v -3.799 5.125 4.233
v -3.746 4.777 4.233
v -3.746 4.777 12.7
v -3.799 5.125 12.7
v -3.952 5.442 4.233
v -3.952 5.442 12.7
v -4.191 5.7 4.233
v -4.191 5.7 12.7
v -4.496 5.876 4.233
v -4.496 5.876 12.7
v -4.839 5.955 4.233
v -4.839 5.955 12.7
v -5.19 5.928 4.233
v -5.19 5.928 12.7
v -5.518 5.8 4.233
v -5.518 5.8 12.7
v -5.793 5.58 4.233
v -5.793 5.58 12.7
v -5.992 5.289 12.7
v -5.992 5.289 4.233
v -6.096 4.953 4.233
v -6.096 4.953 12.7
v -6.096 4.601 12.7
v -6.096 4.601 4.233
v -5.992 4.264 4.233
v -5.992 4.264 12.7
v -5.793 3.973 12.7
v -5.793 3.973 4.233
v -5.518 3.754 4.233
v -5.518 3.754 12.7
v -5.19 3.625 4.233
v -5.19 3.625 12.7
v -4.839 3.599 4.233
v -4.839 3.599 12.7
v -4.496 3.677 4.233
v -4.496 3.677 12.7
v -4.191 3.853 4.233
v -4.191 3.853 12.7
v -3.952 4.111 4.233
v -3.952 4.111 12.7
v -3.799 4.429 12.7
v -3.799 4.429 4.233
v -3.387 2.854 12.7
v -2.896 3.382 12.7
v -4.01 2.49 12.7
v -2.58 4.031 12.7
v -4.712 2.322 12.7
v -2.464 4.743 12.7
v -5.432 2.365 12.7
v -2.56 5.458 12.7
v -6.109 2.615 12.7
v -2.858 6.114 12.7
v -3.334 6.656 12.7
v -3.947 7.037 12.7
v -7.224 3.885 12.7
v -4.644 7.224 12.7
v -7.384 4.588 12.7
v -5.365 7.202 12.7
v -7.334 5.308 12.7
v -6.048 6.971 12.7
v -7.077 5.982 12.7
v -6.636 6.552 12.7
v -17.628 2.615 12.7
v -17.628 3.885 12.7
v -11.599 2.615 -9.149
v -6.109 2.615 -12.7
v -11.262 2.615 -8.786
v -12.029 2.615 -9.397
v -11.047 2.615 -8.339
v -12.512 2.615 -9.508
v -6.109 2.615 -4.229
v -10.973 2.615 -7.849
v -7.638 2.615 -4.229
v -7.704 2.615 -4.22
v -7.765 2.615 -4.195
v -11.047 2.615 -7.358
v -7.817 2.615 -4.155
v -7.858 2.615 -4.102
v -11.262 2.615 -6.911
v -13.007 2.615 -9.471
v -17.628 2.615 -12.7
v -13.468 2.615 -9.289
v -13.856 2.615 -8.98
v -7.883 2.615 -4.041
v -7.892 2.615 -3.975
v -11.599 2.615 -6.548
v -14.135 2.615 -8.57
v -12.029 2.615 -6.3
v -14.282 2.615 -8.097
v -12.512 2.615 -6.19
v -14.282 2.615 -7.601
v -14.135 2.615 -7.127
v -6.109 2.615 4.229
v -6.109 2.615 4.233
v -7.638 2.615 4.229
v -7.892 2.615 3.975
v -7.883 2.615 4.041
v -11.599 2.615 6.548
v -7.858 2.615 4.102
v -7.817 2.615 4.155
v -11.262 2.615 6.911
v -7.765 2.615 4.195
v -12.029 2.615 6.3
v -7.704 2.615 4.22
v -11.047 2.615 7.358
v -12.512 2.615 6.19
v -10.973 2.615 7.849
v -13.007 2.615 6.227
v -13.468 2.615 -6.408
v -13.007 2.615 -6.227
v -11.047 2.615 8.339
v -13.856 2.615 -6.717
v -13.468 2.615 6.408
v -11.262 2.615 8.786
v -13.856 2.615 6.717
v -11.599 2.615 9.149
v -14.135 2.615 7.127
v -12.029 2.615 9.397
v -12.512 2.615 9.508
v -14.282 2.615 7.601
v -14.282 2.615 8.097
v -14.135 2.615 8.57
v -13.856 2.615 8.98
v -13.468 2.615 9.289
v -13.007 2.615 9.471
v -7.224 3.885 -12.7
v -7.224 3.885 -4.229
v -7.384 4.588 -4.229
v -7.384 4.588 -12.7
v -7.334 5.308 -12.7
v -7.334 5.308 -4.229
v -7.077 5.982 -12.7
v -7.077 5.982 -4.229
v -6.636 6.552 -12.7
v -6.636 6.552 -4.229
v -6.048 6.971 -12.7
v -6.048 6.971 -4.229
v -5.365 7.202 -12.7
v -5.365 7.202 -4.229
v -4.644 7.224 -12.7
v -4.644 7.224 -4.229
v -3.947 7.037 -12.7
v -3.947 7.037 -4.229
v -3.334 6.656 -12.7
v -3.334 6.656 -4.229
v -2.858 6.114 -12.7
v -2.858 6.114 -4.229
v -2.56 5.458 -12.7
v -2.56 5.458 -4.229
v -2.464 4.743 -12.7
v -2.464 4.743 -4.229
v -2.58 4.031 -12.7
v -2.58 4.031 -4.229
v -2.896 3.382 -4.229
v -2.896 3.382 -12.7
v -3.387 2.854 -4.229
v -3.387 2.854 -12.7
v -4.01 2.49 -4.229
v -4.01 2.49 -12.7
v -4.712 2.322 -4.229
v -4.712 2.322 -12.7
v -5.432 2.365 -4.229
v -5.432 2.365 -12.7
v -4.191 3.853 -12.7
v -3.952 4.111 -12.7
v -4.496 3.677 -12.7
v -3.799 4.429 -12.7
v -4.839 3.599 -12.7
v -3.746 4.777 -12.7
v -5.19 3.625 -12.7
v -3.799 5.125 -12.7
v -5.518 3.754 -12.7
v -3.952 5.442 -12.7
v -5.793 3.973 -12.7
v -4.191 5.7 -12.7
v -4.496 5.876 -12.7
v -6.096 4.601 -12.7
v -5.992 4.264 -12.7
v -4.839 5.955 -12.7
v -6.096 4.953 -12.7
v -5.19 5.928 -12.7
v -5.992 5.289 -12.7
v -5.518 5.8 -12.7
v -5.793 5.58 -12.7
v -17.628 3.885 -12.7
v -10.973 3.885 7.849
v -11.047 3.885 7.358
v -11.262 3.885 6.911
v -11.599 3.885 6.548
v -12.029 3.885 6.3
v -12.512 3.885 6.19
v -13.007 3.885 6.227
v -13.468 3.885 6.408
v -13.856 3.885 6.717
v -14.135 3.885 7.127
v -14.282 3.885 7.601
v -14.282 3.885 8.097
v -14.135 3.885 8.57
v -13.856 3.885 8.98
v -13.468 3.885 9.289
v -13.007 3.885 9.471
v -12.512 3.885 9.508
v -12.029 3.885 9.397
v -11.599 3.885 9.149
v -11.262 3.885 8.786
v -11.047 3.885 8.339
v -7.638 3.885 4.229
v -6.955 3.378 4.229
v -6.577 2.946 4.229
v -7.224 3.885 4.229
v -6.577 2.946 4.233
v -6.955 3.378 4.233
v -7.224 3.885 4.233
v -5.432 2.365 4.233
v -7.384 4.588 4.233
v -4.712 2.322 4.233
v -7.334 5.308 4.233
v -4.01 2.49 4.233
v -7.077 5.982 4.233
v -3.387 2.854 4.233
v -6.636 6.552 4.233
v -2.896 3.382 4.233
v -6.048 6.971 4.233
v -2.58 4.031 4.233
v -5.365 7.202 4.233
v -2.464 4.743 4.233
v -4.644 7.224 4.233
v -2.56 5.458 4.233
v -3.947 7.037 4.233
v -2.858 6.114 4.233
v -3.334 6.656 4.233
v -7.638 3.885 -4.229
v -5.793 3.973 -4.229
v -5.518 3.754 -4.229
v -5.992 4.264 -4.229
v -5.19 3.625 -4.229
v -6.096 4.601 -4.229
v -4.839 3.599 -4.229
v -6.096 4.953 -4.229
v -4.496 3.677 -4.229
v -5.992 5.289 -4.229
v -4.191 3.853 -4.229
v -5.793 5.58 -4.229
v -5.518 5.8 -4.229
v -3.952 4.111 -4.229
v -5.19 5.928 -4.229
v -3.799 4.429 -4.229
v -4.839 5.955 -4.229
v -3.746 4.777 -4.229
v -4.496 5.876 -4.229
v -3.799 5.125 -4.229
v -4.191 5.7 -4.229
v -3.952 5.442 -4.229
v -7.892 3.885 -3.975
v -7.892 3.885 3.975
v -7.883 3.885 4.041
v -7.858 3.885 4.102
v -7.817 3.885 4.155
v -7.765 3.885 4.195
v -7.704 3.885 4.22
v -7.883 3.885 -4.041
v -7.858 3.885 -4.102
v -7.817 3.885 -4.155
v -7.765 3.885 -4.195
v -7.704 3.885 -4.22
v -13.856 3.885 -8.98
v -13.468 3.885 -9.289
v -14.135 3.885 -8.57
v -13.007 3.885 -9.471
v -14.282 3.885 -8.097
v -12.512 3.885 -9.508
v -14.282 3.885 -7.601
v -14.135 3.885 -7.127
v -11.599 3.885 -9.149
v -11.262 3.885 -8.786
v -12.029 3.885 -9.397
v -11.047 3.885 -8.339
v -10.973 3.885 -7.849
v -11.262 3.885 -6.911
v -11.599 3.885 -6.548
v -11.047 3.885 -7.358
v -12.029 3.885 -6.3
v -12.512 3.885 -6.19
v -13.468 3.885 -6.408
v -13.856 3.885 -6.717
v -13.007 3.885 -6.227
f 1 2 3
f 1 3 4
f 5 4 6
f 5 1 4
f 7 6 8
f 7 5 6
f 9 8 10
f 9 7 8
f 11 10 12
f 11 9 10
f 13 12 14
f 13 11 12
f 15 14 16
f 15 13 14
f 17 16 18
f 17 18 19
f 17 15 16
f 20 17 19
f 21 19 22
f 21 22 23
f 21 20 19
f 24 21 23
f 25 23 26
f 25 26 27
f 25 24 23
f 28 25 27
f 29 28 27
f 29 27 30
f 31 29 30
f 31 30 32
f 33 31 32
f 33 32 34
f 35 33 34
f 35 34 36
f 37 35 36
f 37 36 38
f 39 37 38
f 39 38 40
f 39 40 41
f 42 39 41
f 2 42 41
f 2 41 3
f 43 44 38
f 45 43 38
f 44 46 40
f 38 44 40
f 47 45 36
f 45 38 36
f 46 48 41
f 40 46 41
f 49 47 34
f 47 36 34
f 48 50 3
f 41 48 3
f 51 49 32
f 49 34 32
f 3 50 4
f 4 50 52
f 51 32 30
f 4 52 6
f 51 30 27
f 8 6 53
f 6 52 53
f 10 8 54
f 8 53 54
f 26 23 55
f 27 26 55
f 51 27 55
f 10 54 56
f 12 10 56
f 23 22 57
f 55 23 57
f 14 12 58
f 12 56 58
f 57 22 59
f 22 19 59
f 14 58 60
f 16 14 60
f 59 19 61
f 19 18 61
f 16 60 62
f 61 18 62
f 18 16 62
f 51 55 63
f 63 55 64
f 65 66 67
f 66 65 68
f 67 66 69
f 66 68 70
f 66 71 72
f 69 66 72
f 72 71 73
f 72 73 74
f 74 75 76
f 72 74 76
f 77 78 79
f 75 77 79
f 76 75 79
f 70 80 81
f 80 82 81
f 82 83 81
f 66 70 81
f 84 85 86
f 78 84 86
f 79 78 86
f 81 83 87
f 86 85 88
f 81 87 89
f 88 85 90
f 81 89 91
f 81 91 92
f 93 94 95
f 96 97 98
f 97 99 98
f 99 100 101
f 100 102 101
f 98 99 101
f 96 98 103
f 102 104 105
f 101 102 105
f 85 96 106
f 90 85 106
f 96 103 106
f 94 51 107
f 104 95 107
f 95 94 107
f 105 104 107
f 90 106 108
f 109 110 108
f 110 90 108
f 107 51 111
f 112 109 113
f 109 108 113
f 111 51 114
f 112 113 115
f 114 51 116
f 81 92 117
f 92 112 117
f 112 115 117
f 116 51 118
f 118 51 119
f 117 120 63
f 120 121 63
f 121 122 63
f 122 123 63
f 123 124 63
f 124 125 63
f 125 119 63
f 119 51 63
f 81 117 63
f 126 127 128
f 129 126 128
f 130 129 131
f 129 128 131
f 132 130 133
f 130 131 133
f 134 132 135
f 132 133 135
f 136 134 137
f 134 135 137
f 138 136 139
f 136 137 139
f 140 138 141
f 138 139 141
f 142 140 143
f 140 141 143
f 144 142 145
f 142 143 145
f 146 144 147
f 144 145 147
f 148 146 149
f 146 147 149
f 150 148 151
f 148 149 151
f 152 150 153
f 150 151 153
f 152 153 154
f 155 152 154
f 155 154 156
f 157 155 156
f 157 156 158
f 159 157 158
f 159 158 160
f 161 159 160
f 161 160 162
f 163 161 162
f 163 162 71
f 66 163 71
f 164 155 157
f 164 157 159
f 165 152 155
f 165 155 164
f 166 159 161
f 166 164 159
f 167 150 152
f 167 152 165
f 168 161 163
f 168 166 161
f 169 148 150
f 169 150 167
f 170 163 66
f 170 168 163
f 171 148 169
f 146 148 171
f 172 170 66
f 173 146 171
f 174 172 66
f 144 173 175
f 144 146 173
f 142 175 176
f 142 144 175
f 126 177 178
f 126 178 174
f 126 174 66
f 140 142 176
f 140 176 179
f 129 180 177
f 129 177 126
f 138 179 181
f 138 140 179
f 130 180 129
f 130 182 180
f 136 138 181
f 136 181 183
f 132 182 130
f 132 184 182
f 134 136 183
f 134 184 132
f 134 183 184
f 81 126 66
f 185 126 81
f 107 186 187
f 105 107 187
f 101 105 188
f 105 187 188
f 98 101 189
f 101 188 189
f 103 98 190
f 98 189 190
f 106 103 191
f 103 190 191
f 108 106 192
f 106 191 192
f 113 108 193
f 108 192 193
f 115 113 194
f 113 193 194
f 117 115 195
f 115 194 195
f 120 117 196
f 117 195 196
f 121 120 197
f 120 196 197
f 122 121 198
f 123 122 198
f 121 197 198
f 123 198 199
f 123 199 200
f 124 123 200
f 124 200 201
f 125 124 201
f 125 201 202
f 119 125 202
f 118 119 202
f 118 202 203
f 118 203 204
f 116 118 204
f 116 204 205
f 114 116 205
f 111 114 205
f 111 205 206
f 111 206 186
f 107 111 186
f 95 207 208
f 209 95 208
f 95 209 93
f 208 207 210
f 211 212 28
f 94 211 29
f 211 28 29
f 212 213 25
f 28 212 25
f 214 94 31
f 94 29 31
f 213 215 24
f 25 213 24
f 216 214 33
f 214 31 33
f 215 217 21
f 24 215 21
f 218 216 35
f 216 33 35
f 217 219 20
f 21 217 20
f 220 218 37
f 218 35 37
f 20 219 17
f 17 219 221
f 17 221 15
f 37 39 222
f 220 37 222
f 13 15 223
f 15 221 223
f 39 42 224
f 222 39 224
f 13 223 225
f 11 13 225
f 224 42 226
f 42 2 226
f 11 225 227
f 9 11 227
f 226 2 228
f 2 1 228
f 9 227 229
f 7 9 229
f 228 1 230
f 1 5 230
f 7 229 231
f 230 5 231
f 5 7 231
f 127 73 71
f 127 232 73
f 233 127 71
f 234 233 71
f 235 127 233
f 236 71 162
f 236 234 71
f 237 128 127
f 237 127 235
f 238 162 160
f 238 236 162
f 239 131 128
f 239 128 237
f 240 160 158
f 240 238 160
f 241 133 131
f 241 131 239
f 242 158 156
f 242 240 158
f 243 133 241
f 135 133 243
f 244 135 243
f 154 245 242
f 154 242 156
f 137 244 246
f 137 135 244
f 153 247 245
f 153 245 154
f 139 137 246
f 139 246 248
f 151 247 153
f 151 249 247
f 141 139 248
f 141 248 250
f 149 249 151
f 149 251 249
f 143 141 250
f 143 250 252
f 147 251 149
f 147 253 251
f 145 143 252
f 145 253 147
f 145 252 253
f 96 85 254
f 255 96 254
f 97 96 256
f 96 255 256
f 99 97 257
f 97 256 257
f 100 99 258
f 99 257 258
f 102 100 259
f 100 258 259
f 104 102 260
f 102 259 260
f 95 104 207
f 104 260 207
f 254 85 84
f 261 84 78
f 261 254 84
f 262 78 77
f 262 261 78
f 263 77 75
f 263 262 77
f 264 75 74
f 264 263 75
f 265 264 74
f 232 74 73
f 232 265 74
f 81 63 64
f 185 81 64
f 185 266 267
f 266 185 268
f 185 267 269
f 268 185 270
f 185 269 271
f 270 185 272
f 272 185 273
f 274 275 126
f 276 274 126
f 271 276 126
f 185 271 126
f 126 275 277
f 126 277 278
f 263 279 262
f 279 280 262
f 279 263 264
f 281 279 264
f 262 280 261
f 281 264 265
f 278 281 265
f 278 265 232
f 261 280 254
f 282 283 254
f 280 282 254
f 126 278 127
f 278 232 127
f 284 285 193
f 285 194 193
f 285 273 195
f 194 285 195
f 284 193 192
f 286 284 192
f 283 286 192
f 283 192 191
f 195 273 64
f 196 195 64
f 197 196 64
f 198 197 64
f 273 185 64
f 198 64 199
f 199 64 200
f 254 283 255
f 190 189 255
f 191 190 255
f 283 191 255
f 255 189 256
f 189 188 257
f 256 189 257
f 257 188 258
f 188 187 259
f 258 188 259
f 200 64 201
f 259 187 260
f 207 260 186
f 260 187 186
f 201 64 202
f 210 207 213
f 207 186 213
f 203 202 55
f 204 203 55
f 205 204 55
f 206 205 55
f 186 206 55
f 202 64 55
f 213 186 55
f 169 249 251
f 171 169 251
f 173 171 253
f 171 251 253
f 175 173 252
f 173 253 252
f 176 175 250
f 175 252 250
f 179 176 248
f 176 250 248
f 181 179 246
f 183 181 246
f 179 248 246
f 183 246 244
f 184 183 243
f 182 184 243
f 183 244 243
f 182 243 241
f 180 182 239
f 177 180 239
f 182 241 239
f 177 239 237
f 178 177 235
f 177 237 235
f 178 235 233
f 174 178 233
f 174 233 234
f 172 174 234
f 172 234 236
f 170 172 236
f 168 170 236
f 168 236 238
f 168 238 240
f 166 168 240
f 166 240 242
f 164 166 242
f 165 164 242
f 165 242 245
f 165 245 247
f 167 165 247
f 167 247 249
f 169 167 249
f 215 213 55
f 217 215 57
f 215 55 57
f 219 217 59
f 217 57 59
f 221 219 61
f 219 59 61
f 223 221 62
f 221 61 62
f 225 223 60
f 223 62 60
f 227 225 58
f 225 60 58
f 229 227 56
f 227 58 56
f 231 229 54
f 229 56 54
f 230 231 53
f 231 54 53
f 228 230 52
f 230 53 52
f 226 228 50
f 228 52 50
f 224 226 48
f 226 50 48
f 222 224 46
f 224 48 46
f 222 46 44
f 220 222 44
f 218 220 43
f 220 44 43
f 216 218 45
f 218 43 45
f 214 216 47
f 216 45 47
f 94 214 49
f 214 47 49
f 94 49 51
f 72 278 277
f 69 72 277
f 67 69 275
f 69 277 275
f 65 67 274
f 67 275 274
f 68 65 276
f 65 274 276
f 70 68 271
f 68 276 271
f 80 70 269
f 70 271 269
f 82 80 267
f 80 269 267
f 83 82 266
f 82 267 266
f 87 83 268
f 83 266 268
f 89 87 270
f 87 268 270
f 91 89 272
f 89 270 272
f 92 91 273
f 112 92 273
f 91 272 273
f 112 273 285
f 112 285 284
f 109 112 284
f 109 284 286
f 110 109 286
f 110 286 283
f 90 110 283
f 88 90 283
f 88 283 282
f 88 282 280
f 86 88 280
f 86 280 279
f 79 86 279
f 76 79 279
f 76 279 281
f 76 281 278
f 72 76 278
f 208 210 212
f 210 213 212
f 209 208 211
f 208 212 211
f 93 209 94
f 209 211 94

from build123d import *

# Parameters (mm, degrees)
BOSS_EXTRUDE1_DEPTH      = 12.7
BOSS_EXTRUDE1_DEPTH_BACK = 12.7
SKETCH2_R                = 1.1811
CUT_EXTRUDE1_DEPTH       = 4.23291
CUT_EXTRUDE1_DEPTH_BACK  = 4.2291
SKETCH3_R                = 2.4638
CUT_EXTRUDE2_DEPTH       = 4.2291
CUT_EXTRUDE2_DEPTH_BACK  = 4.2291
SKETCH4_W                = 2.905794066
SKETCH4_H                = 2.259273031
FILLET2_R                = 0.254
FILLET3_R                = 0.254
SKETCH5_R                = 1.6637
CUT_EXTRUDE3_DEPTH       = 2.54


with BuildPart() as part:
    # Sketch2 → Boss-Extrude1 (new, two sides: drawn at the far end of the back side and taken through both)
    with BuildSketch(Plane.XY.offset(-BOSS_EXTRUDE1_DEPTH_BACK)):
        with BuildLine():
            Line((-17.6276, 2.614576368), (-17.6276, 3.884576368))
            Line((-17.6276, 3.884576368), (-7.224163794, 3.884576368))
            ThreePointArc((-7.224163794, 3.884576368), (-3.076448638, 6.402723098), (-6.1087, 2.614576368))
            Line((-6.1087, 2.614576368), (-17.6276, 2.614576368))
        make_face()
        with Locations((-4.9276, 4.776823632)):
            Circle(SKETCH2_R, mode=Mode.SUBTRACT)
    extrude(amount=BOSS_EXTRUDE1_DEPTH + BOSS_EXTRUDE1_DEPTH_BACK)

    # Sketch3 → Cut-Extrude1 (cut, two sides: drawn at the far end of the back side and taken through both)
    with BuildSketch(Plane.XY.offset(-CUT_EXTRUDE1_DEPTH_BACK)):
        with Locations((-4.9276, 4.776823632)):
            Circle(SKETCH3_R)
    extrude(amount=CUT_EXTRUDE1_DEPTH + CUT_EXTRUDE1_DEPTH_BACK, mode=Mode.SUBTRACT)

    # Sketch4 → Cut-Extrude2 (cut, two sides: drawn at the far end of the back side and taken through both)
    with BuildSketch(Plane.XY.offset(-CUT_EXTRUDE2_DEPTH_BACK)):
        with Locations((-6.438882967, 3.744212884)):
            Rectangle(SKETCH4_W, SKETCH4_H)
    extrude(amount=CUT_EXTRUDE2_DEPTH + CUT_EXTRUDE2_DEPTH_BACK, mode=Mode.SUBTRACT)

    # Fillet2
    fillet2_edges = [part.edges().sort_by_distance(p)[0] for p in [
        (-7.89178, 3.249576368, -4.2291),
    ]]
    fillet(fillet2_edges, radius=FILLET2_R)

    # Fillet3
    fillet3_edges = [part.edges().sort_by_distance(p)[0] for p in [
        (-7.89178, 3.249576368, 4.2291),
    ]]
    fillet(fillet3_edges, radius=FILLET3_R)

    # Sketch5 → Cut-Extrude3 (cut)
    with BuildSketch(Plane(origin=(0, 3.884576368, 0), x_dir=(1, 0, 0), z_dir=(0, 1, 0))):
        with Locations((-12.6365, 7.8486)):
            Circle(SKETCH5_R)
        with Locations((-12.6365, -7.8486)):
            Circle(SKETCH5_R)
    extrude(amount=-CUT_EXTRUDE3_DEPTH, mode=Mode.SUBTRACT)


solid = part.part
